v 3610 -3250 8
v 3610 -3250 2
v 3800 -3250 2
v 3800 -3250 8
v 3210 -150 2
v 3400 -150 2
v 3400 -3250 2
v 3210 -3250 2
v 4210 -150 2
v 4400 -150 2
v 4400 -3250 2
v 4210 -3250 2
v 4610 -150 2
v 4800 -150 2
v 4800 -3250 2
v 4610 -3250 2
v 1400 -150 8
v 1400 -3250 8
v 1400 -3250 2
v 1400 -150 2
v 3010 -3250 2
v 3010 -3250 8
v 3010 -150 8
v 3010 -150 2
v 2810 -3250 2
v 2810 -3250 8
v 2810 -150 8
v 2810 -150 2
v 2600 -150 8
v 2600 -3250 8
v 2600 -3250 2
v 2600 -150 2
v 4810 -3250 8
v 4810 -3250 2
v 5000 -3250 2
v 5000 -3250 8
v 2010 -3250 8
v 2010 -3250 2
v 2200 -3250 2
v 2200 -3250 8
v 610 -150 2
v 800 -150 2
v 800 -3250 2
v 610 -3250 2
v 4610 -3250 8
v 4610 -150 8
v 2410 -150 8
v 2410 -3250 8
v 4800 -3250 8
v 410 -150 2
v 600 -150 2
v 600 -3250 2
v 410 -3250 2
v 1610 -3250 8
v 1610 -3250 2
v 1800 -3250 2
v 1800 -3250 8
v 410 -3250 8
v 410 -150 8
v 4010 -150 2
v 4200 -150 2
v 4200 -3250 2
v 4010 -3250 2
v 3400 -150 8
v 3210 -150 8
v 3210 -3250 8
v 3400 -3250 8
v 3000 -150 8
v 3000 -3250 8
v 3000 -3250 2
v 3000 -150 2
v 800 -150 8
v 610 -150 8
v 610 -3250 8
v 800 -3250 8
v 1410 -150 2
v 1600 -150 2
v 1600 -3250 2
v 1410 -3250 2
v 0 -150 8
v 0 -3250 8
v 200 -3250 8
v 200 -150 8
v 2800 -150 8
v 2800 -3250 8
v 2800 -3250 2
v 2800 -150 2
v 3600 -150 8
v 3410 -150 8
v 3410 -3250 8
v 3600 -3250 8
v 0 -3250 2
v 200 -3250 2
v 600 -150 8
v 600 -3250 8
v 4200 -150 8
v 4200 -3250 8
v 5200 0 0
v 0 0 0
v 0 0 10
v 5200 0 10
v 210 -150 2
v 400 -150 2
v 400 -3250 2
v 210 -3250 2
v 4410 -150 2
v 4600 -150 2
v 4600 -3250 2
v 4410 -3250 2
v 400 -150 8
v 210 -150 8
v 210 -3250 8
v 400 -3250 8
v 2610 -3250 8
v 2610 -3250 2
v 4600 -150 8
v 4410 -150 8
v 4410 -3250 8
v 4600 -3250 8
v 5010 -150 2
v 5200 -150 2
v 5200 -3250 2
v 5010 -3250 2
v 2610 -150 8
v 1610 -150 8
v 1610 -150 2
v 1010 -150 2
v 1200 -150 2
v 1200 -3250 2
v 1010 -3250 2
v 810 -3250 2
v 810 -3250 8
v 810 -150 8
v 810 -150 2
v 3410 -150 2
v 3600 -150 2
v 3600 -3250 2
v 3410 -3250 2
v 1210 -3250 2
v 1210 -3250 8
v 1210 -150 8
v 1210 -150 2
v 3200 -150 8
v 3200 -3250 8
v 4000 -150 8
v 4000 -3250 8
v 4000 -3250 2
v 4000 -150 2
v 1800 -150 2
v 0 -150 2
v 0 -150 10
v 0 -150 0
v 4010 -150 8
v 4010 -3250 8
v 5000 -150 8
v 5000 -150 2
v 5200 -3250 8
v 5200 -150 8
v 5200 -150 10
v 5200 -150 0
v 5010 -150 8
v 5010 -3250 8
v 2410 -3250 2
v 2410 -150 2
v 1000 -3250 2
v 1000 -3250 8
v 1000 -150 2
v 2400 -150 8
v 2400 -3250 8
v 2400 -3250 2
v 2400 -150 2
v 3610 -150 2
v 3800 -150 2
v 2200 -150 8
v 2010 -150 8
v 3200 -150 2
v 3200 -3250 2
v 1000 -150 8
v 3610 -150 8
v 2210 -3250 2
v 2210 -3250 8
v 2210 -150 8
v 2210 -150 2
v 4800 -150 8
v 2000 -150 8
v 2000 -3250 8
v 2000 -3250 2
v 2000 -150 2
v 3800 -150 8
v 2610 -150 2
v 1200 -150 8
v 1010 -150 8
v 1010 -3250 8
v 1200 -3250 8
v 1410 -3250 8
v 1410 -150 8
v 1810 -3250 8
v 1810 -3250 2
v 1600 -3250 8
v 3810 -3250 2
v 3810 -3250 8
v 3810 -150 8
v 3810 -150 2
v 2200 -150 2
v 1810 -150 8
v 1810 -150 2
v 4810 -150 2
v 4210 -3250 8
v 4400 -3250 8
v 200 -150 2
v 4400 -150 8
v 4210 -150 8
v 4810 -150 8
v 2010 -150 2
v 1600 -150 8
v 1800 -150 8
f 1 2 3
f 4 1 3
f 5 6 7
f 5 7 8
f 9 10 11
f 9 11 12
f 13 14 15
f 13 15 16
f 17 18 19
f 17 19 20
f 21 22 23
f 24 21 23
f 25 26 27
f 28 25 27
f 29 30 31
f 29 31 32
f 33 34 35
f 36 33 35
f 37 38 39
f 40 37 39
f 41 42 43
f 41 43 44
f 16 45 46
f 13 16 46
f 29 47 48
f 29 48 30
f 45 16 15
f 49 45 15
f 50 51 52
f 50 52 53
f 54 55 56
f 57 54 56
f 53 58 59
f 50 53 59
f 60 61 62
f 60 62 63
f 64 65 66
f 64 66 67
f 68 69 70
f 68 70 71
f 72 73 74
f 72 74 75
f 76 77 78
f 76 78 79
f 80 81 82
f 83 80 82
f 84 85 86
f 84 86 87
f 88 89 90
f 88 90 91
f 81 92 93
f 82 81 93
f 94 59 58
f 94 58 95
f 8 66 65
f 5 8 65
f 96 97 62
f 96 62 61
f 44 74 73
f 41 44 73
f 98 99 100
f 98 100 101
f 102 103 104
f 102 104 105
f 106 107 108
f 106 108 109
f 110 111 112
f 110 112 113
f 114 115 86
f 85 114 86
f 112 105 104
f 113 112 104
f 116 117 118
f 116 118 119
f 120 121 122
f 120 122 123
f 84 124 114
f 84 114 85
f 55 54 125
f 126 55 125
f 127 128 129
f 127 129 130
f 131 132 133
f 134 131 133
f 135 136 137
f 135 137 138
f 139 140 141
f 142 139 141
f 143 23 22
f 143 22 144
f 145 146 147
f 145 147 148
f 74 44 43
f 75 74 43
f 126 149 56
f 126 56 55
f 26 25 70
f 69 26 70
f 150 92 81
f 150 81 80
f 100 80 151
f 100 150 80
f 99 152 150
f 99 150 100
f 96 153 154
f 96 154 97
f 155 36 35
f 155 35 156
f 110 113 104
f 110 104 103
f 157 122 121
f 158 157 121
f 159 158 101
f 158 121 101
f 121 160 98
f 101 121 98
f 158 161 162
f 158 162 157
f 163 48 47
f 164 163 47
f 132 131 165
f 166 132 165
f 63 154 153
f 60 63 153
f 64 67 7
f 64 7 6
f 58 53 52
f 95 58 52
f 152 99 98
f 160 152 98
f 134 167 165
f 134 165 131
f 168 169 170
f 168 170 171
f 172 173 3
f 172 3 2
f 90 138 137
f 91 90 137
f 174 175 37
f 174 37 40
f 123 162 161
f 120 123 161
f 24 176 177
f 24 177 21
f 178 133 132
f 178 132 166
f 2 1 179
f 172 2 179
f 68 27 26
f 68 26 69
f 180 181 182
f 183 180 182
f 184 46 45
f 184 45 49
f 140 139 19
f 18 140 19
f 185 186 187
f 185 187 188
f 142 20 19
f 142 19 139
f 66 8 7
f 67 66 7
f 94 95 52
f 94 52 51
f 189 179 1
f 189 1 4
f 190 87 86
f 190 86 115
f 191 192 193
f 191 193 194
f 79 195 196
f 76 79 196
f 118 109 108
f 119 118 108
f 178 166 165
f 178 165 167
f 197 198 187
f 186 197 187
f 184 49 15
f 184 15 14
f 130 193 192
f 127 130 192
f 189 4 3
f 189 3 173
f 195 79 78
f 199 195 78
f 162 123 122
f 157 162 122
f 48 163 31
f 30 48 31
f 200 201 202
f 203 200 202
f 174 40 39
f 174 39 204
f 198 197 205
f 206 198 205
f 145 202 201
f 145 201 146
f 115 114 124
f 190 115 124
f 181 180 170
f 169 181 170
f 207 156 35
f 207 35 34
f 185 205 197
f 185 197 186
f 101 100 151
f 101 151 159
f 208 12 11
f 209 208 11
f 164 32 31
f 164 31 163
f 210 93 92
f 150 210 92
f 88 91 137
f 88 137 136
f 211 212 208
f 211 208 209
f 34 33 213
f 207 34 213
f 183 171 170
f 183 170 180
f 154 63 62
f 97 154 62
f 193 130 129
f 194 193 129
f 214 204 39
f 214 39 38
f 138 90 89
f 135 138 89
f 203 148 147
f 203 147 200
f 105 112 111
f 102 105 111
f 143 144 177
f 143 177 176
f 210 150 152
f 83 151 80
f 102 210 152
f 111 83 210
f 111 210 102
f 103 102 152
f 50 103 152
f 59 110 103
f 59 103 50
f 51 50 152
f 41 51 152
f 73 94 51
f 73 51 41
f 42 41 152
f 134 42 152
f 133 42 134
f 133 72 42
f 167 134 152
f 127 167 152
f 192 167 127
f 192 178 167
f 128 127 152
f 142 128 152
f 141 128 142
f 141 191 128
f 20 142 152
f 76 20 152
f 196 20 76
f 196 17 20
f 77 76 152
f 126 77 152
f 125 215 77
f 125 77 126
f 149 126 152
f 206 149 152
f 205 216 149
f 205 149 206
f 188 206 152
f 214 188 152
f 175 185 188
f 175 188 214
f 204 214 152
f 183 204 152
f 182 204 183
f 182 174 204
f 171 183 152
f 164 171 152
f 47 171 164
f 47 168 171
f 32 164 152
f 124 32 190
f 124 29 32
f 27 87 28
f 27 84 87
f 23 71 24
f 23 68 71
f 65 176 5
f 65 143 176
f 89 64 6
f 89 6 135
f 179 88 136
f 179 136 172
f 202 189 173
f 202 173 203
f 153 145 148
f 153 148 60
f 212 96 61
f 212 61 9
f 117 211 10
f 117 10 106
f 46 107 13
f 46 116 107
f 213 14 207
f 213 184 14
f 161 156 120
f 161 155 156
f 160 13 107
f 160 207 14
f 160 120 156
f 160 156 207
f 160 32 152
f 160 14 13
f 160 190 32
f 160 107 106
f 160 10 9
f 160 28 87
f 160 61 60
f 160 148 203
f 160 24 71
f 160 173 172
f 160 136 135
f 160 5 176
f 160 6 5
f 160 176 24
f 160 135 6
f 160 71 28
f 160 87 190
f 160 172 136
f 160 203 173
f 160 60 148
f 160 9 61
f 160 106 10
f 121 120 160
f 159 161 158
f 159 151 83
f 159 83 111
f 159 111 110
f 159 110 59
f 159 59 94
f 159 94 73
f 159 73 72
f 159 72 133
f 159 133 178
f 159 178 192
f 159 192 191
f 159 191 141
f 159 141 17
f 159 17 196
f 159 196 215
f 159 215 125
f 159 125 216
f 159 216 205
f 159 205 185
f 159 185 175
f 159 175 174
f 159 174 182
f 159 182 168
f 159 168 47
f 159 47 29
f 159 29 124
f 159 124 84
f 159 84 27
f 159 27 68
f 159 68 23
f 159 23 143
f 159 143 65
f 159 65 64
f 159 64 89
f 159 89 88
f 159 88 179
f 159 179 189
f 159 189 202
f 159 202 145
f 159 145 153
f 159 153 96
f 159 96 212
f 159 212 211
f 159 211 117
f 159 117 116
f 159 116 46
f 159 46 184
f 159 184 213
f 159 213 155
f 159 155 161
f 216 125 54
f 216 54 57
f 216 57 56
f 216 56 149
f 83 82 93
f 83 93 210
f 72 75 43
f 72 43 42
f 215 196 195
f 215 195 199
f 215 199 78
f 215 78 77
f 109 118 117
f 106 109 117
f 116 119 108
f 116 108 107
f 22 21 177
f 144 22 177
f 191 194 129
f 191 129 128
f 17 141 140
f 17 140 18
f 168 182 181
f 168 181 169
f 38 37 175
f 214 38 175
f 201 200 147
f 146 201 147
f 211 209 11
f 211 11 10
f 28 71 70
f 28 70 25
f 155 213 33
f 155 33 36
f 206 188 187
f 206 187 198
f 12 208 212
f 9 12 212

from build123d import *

# Parameters (mm, degrees)
CROQUIS1_W              = 5200
CROQUIS1_H              = 3250
SALIENTE_EXTRUIR1_DEPTH = 10
CROQUIS2_W              = 10
CROQUIS2_H              = 3100
CORTAR_EXTRUIR1_DEPTH   = 10
MATRIZL1_COUNT          = 25
MATRIZL1_PITCH          = 200
CROQUIS4_W              = 5200
CROQUIS4_H              = 3100
CORTAR_EXTRUIR2_DEPTH   = 2
CROQUIS5_W              = 5200
CROQUIS5_H              = 3100
CORTAR_EXTRUIR3_DEPTH   = 2


with BuildPart() as part:
    # Croquis1 → Saliente-Extruir1 (new body)
    with BuildSketch(Plane.XY):
        with Locations((2600, -1625)):
            Rectangle(CROQUIS1_W, CROQUIS1_H)
    extrude(amount=SALIENTE_EXTRUIR1_DEPTH)

    # Croquis2 → Cortar-Extruir1 (cut)
    with BuildSketch(Plane.XY.offset(10)):
        with Locations((205, -1700)):
            Rectangle(CROQUIS2_W, CROQUIS2_H)
    cortar_extruir1 = extrude(amount=-CORTAR_EXTRUIR1_DEPTH, mode=Mode.SUBTRACT)

    # MatrizL1: Cortar-Extruir1 ×25
    with Locations(*[(i * MATRIZL1_PITCH, 0, 0) for i in range(1, MATRIZL1_COUNT)]):
        add(cortar_extruir1, mode=Mode.SUBTRACT)

    # Croquis4 → Cortar-Extruir2 (cut)
    with BuildSketch(Plane.XY.offset(10)):
        with Locations((2600, -1700)):
            Rectangle(CROQUIS4_W, CROQUIS4_H)
    extrude(amount=-CORTAR_EXTRUIR2_DEPTH, mode=Mode.SUBTRACT)

    # Croquis5 → Cortar-Extruir3 (cut)
    with BuildSketch(Plane(origin=(0, 0, 0), x_dir=(-1, 0, 0), z_dir=(0, 0, -1))):
        with Locations((-2600, -1700)):
            Rectangle(CROQUIS5_W, CROQUIS5_H)
    extrude(amount=-CORTAR_EXTRUIR3_DEPTH, mode=Mode.SUBTRACT)


solid = part.part
